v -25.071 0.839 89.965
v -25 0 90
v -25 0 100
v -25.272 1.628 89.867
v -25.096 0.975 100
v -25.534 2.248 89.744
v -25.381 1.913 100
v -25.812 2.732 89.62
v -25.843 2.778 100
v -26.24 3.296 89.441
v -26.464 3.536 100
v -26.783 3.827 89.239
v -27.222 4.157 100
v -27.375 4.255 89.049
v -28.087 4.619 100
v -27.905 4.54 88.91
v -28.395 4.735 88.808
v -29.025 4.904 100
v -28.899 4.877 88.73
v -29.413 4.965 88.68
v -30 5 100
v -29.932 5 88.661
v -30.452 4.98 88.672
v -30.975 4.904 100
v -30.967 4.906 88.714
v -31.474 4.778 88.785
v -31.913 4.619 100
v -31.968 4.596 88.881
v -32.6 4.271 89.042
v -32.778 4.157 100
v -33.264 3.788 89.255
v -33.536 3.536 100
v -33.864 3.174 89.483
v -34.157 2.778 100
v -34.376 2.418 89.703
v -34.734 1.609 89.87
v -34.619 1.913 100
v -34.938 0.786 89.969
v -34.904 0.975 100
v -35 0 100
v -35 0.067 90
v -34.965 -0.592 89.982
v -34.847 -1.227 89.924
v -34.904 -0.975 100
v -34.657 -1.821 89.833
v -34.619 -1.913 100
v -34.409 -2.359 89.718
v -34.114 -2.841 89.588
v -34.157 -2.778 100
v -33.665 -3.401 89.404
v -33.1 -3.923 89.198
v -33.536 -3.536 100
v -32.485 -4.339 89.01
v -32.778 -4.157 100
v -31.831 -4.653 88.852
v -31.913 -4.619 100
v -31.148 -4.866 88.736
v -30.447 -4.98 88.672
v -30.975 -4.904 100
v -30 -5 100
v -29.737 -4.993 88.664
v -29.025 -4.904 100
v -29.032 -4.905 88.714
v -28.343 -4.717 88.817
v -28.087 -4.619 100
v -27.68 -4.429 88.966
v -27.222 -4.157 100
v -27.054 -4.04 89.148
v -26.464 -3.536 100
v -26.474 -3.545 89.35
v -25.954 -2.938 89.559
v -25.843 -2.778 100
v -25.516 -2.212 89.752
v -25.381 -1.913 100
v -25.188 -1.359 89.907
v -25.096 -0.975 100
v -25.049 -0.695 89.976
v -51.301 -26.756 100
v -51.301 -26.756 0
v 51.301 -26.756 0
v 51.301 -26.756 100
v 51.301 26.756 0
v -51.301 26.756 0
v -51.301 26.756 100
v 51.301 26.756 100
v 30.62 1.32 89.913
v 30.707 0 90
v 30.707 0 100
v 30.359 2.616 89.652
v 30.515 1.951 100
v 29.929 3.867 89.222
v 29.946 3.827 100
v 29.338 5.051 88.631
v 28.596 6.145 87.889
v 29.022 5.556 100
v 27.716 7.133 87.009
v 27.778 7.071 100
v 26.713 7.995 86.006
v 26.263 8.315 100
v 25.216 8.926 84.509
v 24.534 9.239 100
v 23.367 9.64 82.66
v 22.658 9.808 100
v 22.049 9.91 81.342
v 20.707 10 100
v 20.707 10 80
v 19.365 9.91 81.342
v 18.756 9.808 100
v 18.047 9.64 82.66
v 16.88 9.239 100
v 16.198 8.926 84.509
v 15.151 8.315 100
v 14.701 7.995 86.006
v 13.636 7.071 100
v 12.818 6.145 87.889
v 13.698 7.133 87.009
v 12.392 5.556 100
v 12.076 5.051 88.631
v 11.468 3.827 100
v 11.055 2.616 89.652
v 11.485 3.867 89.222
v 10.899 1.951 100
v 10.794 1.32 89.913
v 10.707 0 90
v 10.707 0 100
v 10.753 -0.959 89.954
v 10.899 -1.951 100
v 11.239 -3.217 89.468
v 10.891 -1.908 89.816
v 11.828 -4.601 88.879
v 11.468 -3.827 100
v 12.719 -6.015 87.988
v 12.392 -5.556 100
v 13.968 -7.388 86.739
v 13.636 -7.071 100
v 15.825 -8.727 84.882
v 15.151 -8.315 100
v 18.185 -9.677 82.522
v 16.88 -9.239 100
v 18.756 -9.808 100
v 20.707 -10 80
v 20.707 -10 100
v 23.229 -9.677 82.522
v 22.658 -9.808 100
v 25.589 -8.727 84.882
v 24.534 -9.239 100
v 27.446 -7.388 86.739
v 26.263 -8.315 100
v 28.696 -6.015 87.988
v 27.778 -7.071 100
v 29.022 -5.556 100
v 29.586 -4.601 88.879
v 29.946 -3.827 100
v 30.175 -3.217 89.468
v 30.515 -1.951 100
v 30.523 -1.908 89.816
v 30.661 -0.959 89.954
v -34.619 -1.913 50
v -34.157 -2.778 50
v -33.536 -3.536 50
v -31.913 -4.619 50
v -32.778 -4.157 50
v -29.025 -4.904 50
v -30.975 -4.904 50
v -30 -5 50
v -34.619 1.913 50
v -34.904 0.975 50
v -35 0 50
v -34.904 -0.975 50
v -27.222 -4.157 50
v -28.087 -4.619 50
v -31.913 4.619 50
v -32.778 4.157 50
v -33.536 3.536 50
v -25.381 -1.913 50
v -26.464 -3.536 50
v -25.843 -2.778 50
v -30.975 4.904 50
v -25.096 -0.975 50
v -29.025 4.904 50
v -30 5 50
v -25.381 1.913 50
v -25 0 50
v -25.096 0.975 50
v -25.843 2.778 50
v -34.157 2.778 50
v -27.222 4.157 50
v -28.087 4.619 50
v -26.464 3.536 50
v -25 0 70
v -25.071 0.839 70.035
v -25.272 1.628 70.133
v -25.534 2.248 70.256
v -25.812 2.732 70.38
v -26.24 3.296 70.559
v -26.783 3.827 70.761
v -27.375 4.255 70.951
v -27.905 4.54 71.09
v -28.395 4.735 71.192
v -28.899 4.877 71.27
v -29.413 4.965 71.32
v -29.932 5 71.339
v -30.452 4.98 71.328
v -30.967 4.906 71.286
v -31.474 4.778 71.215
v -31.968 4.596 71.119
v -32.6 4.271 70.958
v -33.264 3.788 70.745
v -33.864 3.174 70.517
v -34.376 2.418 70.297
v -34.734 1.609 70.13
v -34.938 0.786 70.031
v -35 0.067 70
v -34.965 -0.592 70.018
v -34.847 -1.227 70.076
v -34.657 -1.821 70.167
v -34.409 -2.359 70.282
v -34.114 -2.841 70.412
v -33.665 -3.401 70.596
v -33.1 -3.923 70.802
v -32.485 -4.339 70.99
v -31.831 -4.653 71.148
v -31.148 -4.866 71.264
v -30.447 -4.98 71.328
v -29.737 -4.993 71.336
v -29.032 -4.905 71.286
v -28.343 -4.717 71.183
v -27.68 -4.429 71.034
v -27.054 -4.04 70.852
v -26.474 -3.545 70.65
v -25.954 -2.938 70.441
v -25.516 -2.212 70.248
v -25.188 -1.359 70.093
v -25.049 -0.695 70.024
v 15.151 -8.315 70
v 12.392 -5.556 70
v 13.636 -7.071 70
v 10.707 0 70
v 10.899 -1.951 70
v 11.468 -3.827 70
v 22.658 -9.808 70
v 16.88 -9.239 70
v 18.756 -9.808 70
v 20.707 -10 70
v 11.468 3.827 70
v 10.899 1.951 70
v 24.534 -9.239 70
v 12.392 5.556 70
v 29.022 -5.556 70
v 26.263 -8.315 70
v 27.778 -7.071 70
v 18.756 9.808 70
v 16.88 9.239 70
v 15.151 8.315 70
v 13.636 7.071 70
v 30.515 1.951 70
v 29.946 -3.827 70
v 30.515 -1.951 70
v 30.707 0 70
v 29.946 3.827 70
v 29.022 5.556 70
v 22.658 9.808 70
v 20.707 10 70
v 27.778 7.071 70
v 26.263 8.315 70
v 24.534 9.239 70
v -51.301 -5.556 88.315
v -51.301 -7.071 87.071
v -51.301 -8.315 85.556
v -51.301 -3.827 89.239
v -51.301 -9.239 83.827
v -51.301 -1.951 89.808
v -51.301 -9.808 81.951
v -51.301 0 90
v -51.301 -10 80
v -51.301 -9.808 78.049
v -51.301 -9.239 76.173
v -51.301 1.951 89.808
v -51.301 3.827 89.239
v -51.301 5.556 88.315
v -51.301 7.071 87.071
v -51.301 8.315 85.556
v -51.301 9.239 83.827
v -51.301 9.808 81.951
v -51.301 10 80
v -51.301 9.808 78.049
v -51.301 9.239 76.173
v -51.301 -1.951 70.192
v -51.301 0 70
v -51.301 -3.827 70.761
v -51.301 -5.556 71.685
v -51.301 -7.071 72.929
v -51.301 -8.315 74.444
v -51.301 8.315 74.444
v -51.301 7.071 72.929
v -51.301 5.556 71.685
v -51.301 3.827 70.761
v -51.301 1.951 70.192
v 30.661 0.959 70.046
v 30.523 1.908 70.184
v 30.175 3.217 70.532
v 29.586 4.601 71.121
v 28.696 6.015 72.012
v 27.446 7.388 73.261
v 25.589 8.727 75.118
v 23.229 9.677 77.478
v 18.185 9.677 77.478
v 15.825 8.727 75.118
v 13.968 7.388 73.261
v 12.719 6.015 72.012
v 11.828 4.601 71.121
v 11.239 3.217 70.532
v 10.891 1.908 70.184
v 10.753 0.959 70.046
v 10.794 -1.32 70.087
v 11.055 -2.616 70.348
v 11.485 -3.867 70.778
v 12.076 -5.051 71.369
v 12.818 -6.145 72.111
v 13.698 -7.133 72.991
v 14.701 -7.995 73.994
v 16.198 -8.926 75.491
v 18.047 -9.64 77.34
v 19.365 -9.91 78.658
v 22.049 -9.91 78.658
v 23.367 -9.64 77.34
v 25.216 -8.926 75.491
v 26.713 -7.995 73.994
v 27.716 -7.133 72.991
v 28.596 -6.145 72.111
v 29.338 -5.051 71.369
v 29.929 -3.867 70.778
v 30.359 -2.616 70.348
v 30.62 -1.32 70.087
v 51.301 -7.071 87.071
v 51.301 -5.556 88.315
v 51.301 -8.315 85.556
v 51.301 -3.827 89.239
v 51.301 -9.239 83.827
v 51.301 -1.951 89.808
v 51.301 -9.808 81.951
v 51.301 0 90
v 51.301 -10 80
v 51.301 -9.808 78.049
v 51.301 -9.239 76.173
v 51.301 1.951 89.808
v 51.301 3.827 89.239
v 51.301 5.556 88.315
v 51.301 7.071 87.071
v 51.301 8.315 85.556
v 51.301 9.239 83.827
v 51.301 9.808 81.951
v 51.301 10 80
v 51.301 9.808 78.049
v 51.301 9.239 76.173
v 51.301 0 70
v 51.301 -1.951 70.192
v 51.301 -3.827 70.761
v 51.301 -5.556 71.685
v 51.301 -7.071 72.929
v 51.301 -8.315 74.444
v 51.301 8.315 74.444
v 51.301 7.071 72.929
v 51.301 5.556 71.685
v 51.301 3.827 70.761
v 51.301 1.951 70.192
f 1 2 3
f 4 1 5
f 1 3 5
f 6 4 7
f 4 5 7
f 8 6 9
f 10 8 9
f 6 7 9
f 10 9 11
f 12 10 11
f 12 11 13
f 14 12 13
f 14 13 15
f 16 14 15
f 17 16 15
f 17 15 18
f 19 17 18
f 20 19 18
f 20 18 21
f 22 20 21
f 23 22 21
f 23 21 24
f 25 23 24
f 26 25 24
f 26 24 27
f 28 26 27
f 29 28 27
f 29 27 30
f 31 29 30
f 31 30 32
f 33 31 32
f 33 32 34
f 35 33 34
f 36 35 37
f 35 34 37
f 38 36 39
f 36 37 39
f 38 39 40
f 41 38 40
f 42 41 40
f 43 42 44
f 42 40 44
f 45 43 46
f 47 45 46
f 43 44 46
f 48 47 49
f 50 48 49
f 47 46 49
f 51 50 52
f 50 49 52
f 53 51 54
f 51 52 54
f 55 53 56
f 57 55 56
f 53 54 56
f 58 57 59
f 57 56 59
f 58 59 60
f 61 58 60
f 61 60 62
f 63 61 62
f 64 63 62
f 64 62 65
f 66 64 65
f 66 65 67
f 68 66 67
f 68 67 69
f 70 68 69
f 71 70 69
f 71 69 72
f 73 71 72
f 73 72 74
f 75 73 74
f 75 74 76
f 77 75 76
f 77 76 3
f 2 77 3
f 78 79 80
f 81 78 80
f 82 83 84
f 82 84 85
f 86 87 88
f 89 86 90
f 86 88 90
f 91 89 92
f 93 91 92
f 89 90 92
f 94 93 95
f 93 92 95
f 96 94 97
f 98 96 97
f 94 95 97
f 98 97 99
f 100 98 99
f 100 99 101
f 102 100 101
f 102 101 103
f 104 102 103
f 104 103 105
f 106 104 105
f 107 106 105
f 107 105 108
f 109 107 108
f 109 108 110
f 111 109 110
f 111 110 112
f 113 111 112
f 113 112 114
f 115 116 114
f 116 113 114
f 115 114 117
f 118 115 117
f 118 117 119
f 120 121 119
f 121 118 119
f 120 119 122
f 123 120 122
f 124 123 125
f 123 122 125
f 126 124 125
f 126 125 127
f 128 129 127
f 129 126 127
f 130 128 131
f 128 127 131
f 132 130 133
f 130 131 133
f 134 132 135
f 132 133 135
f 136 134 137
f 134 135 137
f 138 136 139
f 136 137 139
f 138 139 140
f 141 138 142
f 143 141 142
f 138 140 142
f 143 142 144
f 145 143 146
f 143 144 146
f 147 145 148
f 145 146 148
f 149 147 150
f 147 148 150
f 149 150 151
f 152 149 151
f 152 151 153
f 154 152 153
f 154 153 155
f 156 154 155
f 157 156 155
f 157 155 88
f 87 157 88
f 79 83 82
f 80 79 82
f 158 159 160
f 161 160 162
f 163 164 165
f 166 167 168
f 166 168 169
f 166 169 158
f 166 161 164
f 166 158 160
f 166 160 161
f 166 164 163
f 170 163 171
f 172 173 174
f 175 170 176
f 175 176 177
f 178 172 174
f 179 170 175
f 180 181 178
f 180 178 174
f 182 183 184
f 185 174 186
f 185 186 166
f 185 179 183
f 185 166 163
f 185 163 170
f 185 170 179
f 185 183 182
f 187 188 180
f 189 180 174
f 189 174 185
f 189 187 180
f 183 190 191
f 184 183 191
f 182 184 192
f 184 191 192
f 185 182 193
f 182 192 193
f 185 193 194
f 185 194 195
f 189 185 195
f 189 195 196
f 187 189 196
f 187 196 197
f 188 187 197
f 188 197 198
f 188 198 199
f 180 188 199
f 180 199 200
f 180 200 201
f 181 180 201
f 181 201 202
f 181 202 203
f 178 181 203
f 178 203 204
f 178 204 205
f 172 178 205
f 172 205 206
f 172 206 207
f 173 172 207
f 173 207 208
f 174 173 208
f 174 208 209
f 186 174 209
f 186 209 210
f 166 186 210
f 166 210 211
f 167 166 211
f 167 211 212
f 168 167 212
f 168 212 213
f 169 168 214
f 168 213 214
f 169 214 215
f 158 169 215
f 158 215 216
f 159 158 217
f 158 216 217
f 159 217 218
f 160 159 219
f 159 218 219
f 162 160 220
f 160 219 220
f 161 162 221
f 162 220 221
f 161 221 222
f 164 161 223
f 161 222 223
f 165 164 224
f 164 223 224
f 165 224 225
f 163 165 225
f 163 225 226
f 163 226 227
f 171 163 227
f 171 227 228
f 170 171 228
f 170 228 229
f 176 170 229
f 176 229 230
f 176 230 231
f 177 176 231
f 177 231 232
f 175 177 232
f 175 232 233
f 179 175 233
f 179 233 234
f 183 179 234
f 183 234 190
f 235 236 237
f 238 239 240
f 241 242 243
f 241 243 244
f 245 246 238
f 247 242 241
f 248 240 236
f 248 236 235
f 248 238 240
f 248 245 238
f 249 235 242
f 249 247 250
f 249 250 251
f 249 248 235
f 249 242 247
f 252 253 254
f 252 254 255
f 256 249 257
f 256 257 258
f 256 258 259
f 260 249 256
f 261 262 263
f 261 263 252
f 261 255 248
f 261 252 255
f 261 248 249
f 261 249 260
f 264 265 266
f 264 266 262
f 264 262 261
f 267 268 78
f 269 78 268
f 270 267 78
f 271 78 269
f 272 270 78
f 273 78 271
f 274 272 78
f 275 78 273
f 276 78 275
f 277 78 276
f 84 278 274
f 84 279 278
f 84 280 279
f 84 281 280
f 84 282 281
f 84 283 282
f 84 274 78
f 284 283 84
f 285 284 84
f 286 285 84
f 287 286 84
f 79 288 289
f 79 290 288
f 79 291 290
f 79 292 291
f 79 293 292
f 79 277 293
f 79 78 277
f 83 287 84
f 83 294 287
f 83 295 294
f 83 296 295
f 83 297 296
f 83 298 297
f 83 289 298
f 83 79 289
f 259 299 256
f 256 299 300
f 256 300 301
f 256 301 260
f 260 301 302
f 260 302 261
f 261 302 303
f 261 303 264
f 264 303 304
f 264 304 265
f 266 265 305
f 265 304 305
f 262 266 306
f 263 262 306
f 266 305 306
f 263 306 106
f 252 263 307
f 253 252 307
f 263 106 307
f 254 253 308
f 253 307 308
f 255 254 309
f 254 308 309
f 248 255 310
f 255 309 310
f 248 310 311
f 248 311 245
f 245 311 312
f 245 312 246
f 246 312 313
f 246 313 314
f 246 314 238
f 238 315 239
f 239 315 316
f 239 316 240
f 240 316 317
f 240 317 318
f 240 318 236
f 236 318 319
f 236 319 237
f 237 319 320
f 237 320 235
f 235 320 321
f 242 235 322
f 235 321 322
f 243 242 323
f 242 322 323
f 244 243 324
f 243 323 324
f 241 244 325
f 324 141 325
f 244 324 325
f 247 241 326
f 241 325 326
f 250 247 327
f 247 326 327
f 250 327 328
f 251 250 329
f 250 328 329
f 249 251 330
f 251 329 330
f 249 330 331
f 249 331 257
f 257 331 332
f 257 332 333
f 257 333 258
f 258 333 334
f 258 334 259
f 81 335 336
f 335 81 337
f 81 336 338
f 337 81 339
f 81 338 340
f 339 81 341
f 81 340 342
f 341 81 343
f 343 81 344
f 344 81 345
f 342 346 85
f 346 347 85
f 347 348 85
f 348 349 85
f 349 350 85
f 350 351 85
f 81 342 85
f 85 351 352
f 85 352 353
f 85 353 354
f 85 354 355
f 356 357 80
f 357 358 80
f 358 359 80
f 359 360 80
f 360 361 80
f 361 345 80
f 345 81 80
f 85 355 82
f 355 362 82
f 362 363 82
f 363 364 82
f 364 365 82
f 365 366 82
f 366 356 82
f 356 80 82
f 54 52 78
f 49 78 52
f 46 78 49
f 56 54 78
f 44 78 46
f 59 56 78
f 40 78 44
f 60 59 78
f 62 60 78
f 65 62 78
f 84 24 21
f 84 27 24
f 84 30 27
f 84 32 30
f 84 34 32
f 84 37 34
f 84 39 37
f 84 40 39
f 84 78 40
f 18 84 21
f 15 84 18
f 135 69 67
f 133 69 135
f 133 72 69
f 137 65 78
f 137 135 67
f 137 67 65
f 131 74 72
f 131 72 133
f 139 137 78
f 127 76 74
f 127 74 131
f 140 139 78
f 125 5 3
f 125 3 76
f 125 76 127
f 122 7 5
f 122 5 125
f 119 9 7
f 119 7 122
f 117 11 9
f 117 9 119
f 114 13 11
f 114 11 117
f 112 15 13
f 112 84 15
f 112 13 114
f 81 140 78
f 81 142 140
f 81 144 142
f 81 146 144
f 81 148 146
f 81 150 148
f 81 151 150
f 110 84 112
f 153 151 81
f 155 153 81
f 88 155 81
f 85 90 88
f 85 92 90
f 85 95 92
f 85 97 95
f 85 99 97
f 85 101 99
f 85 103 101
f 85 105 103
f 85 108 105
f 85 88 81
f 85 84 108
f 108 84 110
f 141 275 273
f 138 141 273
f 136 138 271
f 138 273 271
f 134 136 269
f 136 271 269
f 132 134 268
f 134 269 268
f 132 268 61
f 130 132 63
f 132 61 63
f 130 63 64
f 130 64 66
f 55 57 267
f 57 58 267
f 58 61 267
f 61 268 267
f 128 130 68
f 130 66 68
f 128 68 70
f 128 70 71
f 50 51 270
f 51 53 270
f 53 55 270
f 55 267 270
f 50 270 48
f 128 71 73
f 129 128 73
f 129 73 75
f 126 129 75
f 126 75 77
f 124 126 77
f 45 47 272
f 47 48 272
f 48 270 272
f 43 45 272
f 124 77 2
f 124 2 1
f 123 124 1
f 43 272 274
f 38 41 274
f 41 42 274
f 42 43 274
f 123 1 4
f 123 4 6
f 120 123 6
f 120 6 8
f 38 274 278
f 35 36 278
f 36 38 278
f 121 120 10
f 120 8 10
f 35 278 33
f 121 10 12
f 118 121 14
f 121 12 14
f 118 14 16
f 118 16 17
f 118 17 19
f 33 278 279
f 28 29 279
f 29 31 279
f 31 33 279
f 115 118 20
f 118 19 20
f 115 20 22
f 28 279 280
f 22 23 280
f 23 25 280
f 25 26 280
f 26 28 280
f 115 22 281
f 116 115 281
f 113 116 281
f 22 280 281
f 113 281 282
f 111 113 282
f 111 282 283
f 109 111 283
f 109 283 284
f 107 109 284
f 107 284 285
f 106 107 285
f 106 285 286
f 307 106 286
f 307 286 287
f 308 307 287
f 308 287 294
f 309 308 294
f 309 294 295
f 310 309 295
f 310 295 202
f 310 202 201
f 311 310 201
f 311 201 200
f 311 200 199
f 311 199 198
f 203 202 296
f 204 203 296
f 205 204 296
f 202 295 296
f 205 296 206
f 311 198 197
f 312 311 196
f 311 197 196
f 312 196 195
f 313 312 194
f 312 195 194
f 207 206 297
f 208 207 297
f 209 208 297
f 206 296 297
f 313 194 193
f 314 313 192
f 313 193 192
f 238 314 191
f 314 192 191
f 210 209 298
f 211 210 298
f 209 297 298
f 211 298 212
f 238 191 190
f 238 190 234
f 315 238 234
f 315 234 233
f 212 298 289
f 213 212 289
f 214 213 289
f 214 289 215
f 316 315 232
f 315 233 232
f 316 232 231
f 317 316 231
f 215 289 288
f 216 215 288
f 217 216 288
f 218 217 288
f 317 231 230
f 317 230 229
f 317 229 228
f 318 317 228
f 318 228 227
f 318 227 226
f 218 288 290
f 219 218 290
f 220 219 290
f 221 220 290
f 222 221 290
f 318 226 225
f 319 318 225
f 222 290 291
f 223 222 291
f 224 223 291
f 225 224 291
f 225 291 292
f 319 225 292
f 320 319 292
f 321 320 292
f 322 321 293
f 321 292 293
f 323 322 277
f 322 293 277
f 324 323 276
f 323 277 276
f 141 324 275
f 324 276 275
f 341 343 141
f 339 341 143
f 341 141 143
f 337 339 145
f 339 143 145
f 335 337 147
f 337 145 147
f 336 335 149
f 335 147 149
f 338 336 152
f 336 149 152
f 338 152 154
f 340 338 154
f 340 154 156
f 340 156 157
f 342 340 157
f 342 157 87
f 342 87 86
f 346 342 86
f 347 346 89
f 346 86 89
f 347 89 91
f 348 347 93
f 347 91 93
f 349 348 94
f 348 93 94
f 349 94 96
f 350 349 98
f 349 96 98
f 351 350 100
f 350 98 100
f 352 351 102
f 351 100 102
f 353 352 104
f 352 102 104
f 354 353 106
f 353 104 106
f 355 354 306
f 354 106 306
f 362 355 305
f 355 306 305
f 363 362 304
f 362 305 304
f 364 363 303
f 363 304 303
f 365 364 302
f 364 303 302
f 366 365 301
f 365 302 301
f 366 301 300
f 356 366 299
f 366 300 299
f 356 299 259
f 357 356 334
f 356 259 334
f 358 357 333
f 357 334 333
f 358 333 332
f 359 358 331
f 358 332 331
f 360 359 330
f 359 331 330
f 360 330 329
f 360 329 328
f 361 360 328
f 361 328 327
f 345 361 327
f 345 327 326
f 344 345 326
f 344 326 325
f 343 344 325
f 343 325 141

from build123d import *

# Parameters (mm, degrees)
F0_W     = 102.601886
F0_H     = 53.511788
F1_DEPTH = 100
F2_R     = 5
F3_DEPTH = 50
F4_R     = 10
F5_DEPTH = 102.602886
F6_R     = 10
F7_DEPTH = 30


with BuildPart() as f1:
    # F0 (on Top) → F1 (new body)
    with BuildSketch(Plane.XY):
        Rectangle(F0_W, F0_H)
    extrude(amount=F1_DEPTH)

    # F2 (on face) → F3 (cut)
    with BuildSketch(Plane.XY.offset(100)):
        with Locations((-30, 0)):
            Circle(F2_R)
    extrude(amount=-F3_DEPTH, mode=Mode.SUBTRACT)

    # F4 (on face) → F5 (cut, through all)
    with BuildSketch(Plane(origin=(-51.300943, 0, 0), x_dir=(0, -1, 0), z_dir=(-1, 0, 0))):
        with Locations((0, 80)):
            Circle(F4_R)
    extrude(amount=-F5_DEPTH, mode=Mode.SUBTRACT)

    # F6 (on face) → F7 (cut)
    with BuildSketch(Plane.XY.offset(100)):
        with Locations((20.707027, 0)):
            Circle(F6_R)
    extrude(amount=-F7_DEPTH, mode=Mode.SUBTRACT)


solid = f1.part
